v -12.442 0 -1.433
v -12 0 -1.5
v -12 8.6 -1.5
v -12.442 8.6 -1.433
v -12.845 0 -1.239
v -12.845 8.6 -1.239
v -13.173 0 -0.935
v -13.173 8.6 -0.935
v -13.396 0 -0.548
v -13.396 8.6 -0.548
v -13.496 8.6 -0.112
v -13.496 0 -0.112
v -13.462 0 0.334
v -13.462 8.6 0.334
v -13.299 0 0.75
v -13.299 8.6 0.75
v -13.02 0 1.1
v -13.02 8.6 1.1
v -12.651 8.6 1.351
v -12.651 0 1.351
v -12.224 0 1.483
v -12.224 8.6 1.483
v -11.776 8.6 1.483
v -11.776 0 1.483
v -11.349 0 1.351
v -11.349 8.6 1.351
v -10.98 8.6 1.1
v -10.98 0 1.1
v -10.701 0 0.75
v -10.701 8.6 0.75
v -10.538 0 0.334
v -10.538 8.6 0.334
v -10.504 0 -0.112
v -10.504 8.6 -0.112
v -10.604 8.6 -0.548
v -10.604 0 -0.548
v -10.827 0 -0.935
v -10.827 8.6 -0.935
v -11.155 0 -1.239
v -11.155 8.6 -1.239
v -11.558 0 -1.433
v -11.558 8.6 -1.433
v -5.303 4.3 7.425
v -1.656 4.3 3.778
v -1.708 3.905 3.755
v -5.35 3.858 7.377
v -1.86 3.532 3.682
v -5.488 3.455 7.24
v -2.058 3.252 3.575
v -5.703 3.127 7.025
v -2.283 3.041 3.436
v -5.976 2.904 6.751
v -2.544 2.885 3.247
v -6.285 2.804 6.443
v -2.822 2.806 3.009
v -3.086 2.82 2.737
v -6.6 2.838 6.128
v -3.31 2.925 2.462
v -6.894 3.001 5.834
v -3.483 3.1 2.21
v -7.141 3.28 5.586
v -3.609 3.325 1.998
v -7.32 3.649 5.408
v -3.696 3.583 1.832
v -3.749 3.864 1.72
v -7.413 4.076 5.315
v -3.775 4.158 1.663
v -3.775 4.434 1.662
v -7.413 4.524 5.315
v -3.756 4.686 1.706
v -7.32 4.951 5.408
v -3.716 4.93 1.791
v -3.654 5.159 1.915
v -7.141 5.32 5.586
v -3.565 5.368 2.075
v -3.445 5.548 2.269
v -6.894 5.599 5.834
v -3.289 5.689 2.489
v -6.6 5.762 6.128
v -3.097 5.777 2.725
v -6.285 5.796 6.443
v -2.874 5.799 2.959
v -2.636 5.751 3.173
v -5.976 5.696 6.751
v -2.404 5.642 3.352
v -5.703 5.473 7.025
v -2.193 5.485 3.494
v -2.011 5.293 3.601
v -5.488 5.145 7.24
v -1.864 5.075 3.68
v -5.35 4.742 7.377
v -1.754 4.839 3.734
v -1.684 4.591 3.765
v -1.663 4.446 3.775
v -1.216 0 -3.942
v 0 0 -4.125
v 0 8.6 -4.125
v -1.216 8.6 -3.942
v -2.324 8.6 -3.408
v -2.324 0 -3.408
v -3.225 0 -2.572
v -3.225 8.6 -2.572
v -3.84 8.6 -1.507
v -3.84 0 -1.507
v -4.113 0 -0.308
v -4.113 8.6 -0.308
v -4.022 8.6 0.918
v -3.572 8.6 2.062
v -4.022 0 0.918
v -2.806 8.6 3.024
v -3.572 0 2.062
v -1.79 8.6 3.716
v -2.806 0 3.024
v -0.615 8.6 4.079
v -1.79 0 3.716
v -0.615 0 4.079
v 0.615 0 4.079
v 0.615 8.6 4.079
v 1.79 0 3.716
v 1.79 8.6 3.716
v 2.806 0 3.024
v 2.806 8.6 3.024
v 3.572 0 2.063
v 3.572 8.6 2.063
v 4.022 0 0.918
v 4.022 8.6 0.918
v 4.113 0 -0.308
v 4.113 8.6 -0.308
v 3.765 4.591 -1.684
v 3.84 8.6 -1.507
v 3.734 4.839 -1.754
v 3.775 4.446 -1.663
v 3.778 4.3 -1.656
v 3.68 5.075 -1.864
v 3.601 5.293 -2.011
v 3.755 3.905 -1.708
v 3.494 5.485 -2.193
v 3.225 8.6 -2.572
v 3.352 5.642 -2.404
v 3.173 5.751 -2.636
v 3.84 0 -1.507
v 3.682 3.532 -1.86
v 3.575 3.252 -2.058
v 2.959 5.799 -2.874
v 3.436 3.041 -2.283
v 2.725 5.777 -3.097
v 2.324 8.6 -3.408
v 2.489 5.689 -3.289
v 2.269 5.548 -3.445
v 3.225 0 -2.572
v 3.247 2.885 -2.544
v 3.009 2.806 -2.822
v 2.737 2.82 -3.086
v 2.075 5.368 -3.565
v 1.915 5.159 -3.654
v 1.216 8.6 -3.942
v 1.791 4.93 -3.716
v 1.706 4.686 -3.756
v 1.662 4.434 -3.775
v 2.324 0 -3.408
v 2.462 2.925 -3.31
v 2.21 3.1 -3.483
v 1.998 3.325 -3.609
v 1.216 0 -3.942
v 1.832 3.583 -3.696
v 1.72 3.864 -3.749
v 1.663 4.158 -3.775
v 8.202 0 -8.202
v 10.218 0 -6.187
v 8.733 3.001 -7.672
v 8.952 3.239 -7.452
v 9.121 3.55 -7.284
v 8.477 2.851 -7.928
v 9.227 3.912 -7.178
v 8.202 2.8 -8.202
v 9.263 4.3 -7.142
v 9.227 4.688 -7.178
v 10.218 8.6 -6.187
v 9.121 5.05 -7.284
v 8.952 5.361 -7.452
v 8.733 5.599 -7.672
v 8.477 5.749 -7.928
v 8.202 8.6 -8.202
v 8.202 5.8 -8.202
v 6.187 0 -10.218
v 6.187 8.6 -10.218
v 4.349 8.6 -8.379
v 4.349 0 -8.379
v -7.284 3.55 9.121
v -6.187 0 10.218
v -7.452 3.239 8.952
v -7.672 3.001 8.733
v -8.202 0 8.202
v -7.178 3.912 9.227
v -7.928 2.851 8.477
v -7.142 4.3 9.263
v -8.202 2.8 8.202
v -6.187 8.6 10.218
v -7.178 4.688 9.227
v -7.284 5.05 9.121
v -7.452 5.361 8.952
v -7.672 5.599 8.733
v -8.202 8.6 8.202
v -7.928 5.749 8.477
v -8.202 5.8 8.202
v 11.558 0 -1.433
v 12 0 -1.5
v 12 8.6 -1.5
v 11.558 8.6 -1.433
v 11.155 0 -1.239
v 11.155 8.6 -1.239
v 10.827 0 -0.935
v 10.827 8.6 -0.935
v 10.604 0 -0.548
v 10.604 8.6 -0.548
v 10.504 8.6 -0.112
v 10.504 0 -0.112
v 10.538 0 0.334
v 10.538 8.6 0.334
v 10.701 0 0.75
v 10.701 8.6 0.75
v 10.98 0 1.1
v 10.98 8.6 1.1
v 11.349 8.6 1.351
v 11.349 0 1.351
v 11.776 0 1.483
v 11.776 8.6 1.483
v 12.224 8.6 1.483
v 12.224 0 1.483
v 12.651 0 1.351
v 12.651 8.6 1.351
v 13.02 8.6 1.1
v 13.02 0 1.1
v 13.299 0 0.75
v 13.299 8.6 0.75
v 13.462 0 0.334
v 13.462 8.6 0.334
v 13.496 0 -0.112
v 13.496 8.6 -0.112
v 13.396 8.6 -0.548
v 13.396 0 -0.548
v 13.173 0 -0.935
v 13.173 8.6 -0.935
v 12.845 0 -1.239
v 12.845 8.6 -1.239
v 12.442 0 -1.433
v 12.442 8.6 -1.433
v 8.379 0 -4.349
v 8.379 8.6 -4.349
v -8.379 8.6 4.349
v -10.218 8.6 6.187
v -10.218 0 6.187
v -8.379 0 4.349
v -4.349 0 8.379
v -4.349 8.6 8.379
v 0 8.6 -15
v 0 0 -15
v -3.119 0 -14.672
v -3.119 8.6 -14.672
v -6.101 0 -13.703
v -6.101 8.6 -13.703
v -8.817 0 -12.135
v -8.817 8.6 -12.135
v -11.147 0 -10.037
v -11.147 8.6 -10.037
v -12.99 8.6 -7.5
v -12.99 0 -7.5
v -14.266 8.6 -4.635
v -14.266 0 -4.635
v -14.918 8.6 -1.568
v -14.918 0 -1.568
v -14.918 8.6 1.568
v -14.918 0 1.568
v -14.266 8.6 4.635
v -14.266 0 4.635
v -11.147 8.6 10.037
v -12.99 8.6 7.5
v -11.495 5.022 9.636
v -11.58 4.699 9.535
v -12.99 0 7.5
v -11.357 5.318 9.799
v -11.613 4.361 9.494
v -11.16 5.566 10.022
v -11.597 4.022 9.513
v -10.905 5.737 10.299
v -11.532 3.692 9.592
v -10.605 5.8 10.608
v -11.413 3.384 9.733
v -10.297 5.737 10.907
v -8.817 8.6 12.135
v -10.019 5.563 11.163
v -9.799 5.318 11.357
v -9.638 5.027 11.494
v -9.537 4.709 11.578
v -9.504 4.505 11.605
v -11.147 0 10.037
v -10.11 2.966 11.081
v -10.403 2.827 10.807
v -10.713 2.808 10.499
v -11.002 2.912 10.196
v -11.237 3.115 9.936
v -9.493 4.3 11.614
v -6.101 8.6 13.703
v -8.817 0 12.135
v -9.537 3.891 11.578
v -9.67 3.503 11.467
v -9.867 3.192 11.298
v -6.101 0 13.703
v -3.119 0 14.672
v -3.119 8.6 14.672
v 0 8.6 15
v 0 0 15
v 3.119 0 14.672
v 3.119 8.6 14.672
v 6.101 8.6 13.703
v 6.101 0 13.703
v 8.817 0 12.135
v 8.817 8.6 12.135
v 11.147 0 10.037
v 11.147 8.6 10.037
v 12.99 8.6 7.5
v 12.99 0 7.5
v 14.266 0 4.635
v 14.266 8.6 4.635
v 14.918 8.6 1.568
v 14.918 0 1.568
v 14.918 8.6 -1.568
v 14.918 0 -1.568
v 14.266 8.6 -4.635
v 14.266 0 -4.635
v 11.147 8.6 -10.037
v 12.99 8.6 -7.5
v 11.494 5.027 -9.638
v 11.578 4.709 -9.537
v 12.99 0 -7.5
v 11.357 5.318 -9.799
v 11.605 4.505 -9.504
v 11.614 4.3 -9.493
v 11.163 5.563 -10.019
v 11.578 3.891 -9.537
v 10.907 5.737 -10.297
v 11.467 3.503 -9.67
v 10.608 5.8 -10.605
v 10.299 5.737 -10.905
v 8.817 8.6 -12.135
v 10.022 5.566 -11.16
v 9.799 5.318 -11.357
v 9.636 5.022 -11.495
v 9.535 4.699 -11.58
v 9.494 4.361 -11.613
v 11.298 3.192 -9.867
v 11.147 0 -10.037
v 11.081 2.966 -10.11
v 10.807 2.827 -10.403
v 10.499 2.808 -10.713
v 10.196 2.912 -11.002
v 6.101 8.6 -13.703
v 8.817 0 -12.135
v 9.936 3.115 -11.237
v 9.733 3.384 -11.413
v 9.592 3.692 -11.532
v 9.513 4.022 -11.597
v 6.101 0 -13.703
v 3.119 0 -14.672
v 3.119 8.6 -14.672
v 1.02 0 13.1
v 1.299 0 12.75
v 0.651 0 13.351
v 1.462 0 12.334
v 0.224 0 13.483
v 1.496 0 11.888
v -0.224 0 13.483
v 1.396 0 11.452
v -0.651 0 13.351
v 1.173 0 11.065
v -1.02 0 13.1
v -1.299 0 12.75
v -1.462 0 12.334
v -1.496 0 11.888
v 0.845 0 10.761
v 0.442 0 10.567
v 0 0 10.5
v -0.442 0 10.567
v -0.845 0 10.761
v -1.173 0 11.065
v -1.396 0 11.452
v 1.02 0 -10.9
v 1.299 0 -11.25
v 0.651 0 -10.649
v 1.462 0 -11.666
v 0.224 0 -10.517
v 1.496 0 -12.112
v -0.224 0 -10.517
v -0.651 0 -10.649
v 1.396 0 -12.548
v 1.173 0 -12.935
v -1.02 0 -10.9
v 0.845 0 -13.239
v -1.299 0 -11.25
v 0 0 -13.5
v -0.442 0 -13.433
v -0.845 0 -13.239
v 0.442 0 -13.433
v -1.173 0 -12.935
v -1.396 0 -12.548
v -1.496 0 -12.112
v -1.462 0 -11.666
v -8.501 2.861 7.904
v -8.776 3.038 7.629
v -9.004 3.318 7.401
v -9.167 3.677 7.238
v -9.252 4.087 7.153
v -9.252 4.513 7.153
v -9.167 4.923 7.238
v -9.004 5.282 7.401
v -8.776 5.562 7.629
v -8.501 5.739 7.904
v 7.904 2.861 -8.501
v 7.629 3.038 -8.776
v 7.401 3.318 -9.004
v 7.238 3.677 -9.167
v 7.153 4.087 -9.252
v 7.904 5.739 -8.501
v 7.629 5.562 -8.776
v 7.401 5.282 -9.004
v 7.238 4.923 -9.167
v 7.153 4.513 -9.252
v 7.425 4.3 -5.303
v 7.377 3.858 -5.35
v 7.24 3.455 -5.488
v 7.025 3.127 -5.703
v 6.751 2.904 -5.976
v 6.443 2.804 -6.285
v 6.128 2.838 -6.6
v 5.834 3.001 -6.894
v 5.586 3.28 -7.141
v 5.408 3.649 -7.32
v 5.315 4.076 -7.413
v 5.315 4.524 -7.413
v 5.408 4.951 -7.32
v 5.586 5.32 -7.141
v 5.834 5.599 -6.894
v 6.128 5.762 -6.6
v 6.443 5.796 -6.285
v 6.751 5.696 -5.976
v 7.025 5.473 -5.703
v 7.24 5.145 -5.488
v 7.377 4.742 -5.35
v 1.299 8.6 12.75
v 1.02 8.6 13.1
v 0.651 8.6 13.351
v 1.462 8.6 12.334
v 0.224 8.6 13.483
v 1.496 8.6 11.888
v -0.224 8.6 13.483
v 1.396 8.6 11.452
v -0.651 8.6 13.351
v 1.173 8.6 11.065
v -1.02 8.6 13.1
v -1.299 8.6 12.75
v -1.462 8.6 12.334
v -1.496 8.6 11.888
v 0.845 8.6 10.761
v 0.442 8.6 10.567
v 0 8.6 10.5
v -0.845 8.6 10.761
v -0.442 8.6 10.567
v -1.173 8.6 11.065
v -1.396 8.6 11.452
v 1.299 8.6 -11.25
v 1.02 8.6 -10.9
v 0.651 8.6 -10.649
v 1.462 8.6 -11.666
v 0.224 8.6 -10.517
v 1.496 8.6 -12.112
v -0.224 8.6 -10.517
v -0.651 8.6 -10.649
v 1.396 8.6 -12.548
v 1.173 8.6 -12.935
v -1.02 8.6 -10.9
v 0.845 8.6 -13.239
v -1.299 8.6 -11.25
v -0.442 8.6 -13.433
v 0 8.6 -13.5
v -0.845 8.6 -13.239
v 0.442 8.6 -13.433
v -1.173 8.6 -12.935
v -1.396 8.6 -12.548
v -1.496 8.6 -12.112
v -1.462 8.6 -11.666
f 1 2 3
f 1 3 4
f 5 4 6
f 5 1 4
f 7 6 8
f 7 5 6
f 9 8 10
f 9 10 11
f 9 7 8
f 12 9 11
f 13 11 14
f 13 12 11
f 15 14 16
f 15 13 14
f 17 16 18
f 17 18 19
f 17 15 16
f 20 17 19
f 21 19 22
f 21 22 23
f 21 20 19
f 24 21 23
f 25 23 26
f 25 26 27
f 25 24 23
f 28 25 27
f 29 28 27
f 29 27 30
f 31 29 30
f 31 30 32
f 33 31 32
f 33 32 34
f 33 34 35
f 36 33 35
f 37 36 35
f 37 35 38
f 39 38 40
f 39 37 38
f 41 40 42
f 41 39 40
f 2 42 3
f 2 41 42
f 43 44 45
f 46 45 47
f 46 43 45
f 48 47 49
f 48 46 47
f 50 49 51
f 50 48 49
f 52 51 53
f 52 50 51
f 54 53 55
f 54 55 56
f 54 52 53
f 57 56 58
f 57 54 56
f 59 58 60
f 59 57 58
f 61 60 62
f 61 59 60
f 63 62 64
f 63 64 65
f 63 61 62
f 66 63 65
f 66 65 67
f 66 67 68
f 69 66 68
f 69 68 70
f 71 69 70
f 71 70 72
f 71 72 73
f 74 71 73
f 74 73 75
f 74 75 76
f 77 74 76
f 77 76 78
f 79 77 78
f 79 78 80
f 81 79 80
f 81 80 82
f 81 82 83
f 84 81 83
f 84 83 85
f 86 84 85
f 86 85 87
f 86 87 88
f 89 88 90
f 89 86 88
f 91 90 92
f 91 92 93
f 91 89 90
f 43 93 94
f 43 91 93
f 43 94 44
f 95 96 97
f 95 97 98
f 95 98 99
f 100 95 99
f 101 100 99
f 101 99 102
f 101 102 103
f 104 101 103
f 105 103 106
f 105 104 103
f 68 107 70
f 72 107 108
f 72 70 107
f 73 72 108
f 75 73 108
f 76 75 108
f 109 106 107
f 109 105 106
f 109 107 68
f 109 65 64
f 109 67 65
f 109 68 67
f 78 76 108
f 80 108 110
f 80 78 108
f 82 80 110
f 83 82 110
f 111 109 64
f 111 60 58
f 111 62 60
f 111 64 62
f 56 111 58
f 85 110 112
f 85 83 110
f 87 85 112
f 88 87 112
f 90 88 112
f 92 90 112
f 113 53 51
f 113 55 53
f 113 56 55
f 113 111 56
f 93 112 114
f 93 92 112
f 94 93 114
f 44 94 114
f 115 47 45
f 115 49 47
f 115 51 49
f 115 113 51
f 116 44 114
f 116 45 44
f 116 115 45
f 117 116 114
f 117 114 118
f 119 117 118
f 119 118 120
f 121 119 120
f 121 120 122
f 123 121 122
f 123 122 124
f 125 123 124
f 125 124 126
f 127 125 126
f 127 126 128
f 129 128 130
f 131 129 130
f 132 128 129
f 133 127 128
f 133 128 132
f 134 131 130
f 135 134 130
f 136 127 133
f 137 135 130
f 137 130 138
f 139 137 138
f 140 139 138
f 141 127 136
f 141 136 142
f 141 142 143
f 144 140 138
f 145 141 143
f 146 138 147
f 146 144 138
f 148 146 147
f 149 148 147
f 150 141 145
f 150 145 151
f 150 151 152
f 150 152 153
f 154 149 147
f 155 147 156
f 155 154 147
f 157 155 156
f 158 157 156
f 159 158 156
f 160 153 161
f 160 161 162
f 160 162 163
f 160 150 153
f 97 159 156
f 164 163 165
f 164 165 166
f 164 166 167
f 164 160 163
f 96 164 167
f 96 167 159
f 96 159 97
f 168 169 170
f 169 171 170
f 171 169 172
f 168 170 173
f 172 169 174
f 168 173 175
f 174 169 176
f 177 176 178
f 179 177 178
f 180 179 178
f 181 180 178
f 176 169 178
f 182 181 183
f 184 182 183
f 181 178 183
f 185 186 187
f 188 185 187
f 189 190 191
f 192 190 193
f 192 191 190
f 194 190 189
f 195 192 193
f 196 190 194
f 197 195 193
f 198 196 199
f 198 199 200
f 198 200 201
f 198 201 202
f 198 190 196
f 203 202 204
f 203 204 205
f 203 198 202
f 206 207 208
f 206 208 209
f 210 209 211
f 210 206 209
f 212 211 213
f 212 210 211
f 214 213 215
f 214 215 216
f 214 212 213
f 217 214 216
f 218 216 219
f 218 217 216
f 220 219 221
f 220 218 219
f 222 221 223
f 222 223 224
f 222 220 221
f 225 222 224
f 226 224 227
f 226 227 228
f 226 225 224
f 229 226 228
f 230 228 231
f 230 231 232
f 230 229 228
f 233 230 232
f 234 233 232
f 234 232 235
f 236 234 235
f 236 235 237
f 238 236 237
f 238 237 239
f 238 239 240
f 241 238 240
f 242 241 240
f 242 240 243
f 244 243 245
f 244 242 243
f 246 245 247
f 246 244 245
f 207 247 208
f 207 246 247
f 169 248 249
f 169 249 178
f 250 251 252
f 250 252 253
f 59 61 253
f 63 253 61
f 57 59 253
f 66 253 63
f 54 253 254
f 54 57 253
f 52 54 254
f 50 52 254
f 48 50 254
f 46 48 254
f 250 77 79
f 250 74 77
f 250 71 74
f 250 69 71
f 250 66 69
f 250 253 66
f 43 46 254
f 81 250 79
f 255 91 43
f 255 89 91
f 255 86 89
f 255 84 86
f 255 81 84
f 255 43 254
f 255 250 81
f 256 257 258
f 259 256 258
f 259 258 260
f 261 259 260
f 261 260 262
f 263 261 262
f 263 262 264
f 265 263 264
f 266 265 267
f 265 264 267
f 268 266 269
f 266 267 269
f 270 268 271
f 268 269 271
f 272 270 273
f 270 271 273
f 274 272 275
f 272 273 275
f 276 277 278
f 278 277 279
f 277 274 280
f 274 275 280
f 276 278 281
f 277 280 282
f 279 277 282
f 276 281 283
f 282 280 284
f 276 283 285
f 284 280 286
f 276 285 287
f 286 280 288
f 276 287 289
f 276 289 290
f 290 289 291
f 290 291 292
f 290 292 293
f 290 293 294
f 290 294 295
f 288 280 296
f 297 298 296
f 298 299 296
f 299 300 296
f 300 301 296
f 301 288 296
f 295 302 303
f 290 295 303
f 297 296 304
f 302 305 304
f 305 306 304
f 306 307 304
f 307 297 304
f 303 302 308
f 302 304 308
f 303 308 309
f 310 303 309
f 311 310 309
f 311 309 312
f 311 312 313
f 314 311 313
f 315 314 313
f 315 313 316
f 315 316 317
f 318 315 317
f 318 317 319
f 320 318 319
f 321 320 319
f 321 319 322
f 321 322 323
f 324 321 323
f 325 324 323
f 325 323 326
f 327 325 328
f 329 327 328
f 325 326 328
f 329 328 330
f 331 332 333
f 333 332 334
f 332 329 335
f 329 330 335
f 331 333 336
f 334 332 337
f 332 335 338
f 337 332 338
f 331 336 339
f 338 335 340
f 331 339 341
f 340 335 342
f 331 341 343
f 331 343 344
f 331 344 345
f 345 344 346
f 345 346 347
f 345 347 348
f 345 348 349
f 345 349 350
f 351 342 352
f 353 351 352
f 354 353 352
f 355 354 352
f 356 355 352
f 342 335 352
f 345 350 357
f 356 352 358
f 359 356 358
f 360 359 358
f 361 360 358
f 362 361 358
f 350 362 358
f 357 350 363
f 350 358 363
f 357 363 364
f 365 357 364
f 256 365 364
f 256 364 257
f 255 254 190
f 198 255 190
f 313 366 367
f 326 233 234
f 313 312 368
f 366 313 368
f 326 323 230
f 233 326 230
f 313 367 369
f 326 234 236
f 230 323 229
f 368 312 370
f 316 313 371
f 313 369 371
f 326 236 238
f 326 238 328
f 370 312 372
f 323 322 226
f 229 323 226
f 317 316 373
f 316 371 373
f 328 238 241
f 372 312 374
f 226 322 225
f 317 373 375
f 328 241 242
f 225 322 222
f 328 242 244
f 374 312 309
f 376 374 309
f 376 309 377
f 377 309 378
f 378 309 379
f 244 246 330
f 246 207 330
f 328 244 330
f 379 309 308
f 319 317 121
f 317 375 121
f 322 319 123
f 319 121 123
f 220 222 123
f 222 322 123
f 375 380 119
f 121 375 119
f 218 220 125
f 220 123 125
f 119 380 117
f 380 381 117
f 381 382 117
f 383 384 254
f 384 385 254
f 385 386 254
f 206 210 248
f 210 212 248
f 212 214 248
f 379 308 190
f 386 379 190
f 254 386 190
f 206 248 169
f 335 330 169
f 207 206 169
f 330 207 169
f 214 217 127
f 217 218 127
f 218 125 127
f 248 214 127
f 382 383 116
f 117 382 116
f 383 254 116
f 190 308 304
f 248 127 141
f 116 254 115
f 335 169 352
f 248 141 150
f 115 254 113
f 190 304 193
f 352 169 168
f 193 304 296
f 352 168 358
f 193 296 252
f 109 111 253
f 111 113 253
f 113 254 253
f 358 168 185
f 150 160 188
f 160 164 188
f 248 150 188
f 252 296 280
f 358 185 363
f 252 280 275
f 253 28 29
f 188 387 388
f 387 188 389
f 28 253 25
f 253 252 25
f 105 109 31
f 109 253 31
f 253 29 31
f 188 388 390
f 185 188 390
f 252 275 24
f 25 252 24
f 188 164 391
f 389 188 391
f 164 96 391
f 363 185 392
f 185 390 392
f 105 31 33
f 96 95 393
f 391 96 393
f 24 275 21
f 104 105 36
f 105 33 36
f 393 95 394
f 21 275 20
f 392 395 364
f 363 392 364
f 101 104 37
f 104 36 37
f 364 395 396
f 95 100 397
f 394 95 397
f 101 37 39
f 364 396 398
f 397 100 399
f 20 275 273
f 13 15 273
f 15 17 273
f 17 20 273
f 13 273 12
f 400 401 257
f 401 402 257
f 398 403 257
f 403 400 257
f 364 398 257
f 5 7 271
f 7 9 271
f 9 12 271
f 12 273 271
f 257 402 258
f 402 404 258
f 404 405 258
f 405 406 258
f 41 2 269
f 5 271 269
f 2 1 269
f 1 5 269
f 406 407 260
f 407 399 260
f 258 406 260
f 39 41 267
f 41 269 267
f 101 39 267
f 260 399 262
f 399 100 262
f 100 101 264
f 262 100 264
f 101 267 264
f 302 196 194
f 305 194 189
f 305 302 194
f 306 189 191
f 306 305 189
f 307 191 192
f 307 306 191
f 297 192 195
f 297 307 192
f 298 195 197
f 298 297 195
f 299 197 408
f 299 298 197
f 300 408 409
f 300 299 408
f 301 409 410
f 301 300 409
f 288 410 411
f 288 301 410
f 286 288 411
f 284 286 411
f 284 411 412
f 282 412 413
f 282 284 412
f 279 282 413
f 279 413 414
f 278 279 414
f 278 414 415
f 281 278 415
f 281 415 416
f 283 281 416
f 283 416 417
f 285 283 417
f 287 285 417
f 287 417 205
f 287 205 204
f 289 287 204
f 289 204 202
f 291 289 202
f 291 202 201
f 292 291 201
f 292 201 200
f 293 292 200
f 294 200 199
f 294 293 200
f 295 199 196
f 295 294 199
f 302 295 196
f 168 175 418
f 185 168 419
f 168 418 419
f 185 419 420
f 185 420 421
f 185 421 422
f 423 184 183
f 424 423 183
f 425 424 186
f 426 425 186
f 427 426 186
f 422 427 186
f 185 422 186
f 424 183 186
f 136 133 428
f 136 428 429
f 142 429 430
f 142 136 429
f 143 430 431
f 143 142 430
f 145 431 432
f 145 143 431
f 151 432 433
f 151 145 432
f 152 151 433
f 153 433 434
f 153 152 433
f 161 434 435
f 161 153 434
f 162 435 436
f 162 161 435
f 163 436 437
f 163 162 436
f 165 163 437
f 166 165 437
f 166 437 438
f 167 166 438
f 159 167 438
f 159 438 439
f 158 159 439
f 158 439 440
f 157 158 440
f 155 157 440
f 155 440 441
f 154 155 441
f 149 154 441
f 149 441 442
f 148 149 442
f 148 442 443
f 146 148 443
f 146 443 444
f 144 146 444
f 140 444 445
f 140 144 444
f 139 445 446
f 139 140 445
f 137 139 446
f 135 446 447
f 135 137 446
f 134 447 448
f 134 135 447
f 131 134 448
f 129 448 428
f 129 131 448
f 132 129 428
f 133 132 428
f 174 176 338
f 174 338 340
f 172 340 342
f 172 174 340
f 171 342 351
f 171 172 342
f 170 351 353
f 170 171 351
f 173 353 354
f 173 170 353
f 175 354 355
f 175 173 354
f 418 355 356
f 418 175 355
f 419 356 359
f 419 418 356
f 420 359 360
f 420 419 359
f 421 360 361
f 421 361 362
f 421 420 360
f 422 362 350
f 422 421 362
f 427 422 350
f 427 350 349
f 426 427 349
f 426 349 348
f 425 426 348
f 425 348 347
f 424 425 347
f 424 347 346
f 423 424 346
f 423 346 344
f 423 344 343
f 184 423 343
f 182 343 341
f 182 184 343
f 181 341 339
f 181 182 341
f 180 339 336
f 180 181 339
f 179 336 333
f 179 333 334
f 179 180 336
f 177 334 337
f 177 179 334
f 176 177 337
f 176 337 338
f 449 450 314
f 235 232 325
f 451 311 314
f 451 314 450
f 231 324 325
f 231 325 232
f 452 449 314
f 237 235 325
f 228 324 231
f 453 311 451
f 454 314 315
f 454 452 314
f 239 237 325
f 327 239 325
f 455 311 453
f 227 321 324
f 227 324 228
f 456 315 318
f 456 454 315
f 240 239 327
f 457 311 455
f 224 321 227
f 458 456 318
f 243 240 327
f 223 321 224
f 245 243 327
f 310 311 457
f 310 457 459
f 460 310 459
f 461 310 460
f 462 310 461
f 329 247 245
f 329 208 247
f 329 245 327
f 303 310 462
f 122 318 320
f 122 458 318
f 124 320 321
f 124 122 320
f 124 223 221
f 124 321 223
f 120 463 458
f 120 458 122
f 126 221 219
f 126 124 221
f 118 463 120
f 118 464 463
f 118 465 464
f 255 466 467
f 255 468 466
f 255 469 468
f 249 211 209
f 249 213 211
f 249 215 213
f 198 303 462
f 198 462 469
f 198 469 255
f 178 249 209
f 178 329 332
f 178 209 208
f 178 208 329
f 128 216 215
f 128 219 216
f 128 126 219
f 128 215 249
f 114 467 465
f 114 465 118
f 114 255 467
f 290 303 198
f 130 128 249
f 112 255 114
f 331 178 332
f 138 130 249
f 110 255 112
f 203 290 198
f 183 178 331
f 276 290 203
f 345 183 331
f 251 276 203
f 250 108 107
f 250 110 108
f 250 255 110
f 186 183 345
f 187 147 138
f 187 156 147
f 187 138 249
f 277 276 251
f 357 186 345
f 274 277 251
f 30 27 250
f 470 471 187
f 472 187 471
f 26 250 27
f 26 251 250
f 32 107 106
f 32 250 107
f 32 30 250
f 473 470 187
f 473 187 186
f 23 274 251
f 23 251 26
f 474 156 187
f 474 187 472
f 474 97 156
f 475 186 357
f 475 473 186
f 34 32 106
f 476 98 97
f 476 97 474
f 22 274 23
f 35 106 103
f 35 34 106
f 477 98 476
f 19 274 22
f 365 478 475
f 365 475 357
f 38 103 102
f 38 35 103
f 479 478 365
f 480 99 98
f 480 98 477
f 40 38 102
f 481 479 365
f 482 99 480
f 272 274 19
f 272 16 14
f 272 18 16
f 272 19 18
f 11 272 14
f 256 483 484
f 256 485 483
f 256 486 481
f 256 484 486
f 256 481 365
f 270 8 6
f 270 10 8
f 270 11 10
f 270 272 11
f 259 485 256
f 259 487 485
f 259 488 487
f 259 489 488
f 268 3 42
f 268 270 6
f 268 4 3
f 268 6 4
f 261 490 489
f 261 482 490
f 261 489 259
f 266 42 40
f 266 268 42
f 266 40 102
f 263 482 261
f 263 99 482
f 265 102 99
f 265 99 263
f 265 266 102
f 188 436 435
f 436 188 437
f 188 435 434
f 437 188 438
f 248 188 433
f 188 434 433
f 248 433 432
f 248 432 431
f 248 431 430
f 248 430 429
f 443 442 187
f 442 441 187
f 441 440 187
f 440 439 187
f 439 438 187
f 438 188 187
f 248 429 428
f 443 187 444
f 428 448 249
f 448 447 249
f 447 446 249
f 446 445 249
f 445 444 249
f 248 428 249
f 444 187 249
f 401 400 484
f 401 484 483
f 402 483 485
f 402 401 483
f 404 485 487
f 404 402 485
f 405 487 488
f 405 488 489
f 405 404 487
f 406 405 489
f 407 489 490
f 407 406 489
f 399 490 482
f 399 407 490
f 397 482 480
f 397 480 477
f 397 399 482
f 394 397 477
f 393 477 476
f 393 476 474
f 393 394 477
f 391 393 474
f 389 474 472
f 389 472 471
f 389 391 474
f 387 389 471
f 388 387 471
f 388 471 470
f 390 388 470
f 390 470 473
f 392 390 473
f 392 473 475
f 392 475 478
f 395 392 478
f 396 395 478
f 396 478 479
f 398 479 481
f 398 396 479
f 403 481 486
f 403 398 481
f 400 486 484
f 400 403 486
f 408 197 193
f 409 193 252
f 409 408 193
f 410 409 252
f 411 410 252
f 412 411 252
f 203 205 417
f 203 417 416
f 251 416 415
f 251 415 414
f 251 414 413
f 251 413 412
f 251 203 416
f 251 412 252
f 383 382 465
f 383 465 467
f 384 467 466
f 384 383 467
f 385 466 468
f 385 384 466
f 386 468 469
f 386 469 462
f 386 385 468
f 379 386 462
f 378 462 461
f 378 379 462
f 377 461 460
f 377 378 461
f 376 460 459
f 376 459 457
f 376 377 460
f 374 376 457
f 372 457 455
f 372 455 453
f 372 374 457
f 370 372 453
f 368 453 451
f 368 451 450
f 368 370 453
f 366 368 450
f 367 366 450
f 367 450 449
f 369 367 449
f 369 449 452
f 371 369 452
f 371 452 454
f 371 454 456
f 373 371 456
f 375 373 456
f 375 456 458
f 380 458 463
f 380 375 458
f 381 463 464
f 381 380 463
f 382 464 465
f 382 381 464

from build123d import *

# Parameters (mm, degrees)
SKETCH1_R               = 15
SKETCH1_R_2             = 4.125
SKETCH1_R_3             = 1.5
BOSS_EXTRUDE1_DEPTH     = 8.6
CUT_EXTRUDE1_DEPTH      = 8.6
CUT_EXTRUDE2_DEPTH      = 8.6
CUT_EXTRUDE2_DEPTH_BACK = 30
SKETCH3_R               = 1.5


with BuildPart() as part:
    # Sketch1 → Boss-Extrude1 (new body)
    with BuildSketch(Plane(origin=(0, 0, 0), x_dir=(1, 0, 0), z_dir=(0, 1, 0))):
        with Locations(Location((0, 0, 0), (0, 0, 90))):
            Circle(SKETCH1_R)
        with Locations(Location((0, 0, 0), (0, 0, 90))):
            Circle(SKETCH1_R_2, mode=Mode.SUBTRACT)
        with Locations(Location((0, 12, 0), (0, 0, 90))):
            Circle(SKETCH1_R_3, mode=Mode.SUBTRACT)
        with Locations(Location((12, 0, 0), (0, 0, 90))):
            Circle(SKETCH1_R_3, mode=Mode.SUBTRACT)
        with Locations(Location((0, -12, 0), (0, 0, 90))):
            Circle(SKETCH1_R_3, mode=Mode.SUBTRACT)
        with Locations(Location((-12, 0, 0), (0, 0, 90))):
            Circle(SKETCH1_R_3, mode=Mode.SUBTRACT)
    extrude(amount=BOSS_EXTRUDE1_DEPTH)

    # Sketch2 → Cut-Extrude1 (cut)
    with BuildSketch(Plane(origin=(0, 8.6, 0), x_dir=(1, 0, 0), z_dir=(0, 1, 0))):
        Polygon((8.202438662, 8.202438662), (6.187184335, 10.217692988), (4.348706704, 8.379215357), (8.379215357, 4.348706704), (10.217692988, 6.187184335), align=None)
        Polygon((-10.217692988, -6.187184335), (-8.379215357, -4.348706704), (-4.348706704, -8.379215357), (-6.187184335, -10.217692988), (-8.202438662, -8.202438662), align=None)
    extrude(amount=-CUT_EXTRUDE1_DEPTH, mode=Mode.SUBTRACT)

    # Sketch3 → Cut-Extrude2 (cut, two sides: drawn at the far end of the back side and taken through both)
    with BuildSketch(Plane(origin=(6.363961031, 0, -6.363961031), x_dir=(-0.7071067811865489, 0, -0.7071067811865461), z_dir=(0.7071067811865461, 0, -0.7071067811865489)).offset(-CUT_EXTRUDE2_DEPTH_BACK)):
        with Locations(Location((0, 4.3, 0), (0, 0, 180))):
            Circle(SKETCH3_R)
    extrude(amount=CUT_EXTRUDE2_DEPTH + CUT_EXTRUDE2_DEPTH_BACK, mode=Mode.SUBTRACT)


solid = part.part
